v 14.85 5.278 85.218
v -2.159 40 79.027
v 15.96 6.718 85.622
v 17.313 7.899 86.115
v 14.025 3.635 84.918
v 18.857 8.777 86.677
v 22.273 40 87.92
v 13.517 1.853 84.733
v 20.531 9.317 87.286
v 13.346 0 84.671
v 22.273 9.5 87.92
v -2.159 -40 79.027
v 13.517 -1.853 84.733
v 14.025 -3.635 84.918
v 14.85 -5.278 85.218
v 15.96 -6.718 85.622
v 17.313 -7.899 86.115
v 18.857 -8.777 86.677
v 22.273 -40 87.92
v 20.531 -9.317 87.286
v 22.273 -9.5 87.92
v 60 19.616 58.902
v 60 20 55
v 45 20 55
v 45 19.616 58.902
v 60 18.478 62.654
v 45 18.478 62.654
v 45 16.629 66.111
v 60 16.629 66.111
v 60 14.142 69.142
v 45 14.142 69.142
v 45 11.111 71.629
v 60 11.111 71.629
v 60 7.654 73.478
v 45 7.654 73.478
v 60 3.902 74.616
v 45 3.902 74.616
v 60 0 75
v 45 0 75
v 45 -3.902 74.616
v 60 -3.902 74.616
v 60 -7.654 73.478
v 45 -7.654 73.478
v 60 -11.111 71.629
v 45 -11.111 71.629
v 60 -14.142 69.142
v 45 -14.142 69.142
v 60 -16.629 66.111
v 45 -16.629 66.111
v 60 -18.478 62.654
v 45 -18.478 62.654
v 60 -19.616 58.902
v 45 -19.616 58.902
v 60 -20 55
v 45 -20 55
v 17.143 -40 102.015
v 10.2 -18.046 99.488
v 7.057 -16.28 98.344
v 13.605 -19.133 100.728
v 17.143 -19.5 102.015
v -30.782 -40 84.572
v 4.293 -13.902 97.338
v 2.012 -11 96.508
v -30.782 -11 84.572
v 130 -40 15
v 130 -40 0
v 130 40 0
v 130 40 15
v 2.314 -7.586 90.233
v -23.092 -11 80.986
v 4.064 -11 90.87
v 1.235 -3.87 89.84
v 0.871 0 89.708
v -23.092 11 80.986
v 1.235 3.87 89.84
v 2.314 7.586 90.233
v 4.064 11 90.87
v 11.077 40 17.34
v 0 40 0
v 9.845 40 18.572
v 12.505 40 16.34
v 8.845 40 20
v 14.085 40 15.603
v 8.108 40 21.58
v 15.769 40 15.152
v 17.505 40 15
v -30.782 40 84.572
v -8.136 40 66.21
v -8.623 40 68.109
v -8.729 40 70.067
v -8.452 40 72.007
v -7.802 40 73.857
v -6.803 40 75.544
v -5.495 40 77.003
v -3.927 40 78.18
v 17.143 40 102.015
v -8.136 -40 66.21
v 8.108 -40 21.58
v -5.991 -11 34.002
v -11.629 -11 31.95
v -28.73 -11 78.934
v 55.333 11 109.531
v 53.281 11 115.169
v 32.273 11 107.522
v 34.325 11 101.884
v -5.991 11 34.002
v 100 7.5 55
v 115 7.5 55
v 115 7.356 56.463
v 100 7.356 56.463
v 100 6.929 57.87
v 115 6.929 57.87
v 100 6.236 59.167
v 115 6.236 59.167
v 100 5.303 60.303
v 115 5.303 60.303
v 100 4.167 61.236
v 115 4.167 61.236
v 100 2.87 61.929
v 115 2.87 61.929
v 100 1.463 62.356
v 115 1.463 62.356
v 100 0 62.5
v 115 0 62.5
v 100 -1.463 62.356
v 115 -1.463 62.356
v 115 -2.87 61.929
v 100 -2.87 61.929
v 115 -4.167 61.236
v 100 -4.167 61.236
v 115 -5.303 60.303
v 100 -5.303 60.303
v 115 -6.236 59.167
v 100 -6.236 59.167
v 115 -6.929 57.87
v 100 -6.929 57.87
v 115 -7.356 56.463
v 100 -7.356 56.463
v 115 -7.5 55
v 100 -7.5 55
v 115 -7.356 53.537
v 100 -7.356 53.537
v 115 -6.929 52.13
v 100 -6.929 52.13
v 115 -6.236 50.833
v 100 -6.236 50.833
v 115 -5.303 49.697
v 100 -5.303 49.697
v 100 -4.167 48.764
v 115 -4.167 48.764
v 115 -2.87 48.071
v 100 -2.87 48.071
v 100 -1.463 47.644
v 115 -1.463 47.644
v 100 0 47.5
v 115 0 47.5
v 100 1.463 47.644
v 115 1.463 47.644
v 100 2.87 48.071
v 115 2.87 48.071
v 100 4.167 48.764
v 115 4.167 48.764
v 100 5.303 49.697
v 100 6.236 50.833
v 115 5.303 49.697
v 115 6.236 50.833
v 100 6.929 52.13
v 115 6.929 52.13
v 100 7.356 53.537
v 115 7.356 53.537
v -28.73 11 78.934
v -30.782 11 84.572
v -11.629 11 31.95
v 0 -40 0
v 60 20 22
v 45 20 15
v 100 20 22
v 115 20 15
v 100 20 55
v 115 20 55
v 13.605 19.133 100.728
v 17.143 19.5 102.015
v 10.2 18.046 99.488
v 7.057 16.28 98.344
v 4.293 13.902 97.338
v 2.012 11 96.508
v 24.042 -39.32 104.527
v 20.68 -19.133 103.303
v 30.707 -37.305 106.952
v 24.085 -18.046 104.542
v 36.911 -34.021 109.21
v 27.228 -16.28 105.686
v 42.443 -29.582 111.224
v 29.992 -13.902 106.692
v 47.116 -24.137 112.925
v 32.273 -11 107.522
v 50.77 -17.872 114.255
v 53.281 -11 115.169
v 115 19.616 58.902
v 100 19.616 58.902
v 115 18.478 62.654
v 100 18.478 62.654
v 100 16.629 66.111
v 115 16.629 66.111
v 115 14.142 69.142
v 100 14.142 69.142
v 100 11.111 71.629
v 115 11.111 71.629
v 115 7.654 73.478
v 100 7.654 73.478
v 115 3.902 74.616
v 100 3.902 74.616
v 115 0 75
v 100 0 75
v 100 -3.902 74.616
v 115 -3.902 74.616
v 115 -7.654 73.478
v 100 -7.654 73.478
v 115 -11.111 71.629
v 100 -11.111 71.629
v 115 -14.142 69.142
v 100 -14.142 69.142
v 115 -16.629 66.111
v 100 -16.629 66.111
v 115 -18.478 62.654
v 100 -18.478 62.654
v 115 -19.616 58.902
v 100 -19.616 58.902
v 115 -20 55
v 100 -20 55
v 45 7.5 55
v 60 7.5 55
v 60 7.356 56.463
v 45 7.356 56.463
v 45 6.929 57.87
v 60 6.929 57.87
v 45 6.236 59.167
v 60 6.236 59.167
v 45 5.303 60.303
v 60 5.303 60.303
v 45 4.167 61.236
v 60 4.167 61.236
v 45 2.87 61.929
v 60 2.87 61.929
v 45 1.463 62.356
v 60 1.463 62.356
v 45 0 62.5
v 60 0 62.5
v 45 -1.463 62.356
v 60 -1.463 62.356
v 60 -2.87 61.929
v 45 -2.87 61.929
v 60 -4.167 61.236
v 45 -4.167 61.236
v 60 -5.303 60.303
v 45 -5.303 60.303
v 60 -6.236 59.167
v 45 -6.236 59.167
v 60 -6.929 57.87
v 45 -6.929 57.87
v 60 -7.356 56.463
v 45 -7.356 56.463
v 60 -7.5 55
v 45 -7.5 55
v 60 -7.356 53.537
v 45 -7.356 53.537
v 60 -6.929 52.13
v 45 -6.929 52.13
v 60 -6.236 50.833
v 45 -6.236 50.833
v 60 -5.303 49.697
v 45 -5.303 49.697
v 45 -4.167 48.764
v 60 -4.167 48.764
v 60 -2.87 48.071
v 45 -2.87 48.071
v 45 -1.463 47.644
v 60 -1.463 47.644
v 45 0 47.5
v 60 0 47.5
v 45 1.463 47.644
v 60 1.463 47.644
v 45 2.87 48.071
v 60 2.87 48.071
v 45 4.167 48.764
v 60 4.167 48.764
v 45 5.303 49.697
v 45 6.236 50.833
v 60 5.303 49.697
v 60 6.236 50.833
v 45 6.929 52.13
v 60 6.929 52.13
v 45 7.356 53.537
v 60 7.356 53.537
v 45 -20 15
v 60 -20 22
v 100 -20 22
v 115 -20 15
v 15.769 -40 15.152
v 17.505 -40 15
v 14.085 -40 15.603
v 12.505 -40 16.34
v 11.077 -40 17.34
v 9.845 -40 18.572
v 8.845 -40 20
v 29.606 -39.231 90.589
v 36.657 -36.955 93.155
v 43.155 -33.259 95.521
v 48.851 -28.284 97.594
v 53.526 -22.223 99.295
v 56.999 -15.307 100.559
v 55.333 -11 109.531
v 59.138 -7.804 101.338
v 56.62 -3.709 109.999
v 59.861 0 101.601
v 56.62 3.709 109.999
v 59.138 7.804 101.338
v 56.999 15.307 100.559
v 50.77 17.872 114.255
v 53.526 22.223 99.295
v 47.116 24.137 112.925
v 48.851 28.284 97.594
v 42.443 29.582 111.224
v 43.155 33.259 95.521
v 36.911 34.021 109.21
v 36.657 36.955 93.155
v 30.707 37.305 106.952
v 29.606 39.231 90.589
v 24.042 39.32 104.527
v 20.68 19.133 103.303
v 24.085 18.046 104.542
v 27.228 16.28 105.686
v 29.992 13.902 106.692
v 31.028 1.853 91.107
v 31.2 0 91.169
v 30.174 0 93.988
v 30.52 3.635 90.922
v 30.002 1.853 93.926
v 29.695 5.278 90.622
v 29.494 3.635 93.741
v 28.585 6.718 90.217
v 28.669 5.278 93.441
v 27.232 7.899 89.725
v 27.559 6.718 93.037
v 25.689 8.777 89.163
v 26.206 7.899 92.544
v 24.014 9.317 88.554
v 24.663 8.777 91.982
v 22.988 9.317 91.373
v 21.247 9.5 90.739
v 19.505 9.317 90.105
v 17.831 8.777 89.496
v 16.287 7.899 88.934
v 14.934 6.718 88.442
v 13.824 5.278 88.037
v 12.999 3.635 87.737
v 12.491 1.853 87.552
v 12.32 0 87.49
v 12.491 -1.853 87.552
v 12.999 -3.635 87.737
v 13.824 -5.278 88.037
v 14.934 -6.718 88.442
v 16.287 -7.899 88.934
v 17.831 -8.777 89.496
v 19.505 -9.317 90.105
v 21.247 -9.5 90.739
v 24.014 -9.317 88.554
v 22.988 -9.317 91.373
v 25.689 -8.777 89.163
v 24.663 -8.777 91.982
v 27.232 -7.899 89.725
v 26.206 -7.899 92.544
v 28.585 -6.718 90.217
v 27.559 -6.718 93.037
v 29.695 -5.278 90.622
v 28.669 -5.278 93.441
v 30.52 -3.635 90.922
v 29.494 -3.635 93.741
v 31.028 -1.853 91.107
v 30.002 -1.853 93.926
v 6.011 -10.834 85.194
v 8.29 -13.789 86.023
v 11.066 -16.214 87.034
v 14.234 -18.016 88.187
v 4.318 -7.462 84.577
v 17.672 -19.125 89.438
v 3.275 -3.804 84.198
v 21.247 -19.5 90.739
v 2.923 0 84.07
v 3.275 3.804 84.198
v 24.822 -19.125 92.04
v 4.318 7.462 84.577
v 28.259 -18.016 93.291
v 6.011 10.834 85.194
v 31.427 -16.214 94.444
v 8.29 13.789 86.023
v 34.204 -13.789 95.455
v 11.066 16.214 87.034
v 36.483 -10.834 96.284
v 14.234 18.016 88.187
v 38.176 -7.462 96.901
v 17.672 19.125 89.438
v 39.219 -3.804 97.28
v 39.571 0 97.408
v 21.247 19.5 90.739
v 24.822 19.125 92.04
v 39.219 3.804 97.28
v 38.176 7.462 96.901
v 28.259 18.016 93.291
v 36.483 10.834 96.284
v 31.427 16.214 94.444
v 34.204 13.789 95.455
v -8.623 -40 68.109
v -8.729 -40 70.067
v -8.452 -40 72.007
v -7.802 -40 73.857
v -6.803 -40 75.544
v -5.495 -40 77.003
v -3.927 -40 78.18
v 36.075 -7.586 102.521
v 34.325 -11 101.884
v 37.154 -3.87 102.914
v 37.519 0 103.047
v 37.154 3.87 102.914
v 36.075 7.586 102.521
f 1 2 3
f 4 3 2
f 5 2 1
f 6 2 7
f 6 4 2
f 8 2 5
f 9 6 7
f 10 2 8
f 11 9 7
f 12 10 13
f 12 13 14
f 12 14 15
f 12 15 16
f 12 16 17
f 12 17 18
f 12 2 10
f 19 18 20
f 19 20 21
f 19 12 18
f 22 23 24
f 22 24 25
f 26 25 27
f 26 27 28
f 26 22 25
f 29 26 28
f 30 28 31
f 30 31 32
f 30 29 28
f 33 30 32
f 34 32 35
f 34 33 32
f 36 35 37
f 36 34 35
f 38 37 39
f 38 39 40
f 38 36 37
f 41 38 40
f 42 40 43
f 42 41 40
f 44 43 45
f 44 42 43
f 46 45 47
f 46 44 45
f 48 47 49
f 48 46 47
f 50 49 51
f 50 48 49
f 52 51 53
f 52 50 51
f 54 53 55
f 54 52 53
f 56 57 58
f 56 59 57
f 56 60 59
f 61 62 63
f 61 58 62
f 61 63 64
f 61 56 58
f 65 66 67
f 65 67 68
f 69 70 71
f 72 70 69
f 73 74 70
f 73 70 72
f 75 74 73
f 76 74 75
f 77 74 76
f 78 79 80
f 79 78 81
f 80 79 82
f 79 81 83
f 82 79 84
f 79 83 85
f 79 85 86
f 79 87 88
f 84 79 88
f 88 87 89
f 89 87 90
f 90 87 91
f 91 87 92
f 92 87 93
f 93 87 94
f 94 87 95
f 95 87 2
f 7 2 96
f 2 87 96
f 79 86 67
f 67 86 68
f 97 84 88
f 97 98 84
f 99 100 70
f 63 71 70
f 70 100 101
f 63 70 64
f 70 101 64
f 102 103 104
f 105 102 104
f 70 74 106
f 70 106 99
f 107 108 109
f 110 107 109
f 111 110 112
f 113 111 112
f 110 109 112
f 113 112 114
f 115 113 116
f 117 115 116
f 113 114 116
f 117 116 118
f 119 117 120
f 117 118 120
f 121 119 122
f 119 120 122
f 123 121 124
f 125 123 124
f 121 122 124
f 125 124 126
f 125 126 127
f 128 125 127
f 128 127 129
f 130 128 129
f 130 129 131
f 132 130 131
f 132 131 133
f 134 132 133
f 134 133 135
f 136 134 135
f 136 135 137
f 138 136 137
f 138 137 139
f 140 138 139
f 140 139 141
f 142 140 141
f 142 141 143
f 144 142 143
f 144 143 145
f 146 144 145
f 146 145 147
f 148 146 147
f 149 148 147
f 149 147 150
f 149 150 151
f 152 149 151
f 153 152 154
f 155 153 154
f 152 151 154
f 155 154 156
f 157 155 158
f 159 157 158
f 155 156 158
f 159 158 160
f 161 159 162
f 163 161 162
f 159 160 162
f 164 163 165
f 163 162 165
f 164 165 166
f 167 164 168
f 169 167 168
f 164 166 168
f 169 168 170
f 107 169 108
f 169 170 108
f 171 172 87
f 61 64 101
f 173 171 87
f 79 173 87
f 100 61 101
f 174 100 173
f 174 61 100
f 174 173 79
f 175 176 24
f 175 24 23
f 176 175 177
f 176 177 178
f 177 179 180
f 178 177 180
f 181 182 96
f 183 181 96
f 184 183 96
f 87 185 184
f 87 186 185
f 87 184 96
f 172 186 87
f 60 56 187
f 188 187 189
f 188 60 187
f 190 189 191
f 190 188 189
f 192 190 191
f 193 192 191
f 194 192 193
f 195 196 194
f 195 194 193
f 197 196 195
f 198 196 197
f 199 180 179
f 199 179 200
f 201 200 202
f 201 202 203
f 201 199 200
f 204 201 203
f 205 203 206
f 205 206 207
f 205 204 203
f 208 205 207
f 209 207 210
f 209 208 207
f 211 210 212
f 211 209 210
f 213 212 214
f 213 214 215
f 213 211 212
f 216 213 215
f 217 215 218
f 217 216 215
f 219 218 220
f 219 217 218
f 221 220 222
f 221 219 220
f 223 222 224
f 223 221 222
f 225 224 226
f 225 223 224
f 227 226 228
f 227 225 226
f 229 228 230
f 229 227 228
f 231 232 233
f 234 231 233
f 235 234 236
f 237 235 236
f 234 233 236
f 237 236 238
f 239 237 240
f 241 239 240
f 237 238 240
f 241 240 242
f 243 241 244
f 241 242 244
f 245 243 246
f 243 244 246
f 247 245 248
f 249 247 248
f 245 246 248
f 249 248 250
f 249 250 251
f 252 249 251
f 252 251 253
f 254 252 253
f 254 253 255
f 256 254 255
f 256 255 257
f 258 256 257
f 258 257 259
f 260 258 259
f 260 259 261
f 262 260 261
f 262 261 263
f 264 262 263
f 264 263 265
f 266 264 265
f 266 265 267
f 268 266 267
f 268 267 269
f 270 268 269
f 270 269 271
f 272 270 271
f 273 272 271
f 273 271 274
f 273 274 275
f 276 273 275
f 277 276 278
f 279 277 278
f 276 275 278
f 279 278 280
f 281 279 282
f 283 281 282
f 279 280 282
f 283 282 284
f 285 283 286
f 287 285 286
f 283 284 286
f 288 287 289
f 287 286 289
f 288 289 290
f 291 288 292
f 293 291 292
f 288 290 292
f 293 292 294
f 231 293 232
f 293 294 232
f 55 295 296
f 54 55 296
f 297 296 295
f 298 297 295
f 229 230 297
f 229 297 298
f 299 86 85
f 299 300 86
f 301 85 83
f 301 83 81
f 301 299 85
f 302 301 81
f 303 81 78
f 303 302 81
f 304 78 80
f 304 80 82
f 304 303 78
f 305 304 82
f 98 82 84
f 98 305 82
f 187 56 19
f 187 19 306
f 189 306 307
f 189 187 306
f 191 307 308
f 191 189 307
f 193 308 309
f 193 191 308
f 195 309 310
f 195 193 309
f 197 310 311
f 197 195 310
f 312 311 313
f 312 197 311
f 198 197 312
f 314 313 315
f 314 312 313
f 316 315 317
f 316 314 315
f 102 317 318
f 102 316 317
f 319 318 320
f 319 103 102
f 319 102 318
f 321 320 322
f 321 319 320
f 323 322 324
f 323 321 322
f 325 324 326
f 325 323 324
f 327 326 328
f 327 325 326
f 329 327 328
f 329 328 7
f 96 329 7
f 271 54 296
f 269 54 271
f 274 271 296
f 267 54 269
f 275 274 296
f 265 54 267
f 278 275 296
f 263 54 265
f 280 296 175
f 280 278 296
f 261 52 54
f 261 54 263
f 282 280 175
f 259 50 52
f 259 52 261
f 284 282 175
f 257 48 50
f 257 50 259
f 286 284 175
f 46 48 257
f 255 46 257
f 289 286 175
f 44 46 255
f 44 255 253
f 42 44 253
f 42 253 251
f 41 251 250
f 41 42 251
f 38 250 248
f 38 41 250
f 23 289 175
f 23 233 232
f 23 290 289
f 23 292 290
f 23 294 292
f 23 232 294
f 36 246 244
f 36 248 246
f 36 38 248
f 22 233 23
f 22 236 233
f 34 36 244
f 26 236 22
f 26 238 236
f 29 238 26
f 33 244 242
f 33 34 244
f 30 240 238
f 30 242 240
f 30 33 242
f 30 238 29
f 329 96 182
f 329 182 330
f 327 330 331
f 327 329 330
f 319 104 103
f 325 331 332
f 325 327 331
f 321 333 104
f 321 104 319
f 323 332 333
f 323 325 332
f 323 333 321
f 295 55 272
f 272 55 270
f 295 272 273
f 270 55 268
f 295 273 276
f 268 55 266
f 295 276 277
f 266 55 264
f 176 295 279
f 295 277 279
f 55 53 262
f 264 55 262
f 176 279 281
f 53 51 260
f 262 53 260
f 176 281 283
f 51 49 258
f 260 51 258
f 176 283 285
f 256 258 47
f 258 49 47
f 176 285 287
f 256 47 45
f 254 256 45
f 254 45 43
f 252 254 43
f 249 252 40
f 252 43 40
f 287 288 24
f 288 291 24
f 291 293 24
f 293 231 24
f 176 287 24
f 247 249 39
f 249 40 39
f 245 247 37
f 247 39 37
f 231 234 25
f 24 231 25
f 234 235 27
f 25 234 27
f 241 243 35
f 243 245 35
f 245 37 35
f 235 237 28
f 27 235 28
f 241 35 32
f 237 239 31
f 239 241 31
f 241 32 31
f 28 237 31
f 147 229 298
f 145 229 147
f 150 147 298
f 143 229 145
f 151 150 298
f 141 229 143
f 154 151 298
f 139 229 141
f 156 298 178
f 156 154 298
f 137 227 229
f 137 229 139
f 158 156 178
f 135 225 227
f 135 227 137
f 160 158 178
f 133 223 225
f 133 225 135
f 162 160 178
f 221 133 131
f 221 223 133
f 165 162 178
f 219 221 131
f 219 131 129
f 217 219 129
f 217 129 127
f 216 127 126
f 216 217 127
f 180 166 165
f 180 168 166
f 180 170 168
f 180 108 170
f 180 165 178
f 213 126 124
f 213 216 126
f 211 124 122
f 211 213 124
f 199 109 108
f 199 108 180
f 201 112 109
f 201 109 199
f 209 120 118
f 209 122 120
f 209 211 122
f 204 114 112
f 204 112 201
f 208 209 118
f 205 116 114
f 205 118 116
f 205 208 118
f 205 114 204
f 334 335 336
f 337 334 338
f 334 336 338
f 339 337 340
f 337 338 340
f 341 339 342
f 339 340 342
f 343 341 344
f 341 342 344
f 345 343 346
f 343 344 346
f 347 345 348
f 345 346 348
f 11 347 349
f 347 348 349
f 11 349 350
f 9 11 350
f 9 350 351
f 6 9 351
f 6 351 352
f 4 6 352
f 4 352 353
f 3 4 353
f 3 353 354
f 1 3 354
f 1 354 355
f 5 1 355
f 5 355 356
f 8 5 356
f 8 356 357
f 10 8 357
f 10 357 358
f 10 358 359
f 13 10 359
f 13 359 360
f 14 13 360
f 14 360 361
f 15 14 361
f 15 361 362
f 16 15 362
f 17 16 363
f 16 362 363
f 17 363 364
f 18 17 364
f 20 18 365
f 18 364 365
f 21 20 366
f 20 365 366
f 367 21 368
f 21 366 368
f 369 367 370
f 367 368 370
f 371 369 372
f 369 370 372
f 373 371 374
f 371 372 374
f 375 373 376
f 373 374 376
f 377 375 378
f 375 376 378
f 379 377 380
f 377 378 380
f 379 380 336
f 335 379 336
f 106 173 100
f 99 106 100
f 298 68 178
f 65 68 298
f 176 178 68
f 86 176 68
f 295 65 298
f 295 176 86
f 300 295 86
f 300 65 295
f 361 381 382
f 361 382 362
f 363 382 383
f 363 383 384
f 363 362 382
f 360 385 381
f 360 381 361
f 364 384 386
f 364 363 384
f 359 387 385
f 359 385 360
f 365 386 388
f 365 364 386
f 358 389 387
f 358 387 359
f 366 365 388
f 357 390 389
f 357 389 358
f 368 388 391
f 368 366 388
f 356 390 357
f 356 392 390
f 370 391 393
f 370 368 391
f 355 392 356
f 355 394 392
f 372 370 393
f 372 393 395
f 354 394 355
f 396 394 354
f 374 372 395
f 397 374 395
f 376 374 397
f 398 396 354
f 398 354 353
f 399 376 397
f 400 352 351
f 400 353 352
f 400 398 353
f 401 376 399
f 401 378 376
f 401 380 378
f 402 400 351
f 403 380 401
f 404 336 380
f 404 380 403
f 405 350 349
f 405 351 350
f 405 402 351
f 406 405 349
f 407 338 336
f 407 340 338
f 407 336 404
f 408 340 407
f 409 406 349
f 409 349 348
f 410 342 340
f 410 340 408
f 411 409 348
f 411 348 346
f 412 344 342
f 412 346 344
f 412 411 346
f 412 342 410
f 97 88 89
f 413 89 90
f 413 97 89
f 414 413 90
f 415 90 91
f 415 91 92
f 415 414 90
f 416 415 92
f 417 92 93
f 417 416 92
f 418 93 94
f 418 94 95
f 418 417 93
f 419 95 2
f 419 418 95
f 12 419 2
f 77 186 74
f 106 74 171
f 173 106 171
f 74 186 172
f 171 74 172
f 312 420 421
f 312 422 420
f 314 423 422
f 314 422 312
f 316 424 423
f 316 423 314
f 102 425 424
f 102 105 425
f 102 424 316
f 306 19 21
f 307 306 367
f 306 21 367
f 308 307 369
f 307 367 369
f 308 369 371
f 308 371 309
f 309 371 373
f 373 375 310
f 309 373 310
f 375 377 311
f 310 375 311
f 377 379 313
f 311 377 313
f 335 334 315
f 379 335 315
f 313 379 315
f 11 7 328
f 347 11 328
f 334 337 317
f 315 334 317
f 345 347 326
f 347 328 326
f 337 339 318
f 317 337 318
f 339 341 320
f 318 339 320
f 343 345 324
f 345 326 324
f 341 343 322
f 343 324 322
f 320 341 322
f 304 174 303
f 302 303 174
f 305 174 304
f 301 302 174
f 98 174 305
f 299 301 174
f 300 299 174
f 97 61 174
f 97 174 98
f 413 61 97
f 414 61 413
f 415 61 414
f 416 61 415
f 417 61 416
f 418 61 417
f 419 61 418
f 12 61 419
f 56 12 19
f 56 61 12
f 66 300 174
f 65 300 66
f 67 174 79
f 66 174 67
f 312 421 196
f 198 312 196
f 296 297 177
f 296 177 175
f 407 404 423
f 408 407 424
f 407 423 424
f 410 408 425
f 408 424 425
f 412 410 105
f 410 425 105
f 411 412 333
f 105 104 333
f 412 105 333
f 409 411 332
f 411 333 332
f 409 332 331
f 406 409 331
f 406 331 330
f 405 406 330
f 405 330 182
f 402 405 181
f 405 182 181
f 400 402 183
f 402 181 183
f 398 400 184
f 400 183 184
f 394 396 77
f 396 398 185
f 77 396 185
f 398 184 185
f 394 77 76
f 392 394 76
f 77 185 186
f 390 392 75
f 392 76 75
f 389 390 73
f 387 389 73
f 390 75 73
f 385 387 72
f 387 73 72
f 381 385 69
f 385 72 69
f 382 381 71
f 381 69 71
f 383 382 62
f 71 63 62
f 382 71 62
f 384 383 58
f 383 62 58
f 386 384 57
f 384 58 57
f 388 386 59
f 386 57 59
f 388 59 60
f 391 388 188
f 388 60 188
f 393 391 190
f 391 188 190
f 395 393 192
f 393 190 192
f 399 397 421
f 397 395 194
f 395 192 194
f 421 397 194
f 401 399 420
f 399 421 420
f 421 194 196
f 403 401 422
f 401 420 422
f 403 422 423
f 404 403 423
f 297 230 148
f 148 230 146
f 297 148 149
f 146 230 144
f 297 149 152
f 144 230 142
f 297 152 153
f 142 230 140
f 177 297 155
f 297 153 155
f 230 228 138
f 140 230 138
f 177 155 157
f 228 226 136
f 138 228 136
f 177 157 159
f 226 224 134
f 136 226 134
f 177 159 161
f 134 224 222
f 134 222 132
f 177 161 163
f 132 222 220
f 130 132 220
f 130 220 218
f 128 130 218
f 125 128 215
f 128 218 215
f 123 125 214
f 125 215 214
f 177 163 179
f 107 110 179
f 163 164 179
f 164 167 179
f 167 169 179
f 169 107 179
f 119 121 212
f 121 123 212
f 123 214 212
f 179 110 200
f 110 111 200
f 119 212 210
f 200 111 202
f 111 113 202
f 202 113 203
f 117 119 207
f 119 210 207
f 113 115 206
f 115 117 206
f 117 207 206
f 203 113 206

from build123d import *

# Parameters (mm, degrees)
F1_DEPTH  = 40
F3_DEPTH  = 15
F4_DEPTH  = 20
F6_DEPTH  = 15
F8_DEPTH  = 15
F9_R      = 7.5
F10_DEPTH = 70
F13_DEPTH = 6
F11_W     = 22
F11_H     = 56
F14_DEPTH = 6
F15_R     = 9.5
F16_DEPTH = 30
F15_R_2   = 19.5
F17_DEPTH = 12
F18_R     = 10


with BuildPart() as f1:
    # F0 (on Front) → F1 (new body, symmetric)
    with BuildSketch(Plane.XZ):
        Polygon((-30.7818128993, 84.5723358707), (0, 0), (130, 0), (130, 15), (115, 15), (45, 15), (10.5031130731, 15), (-11.5561214376, 75.6072487088), (22.2728129107, 87.9199738686), (17.1425107608, 102.0153631803), align=None)
    extrude(amount=F1_DEPTH, both=True)

    # F2 (on face) → F3 (join)
    with BuildSketch(Plane(origin=(-30.7818128993, 0, 84.5723358707), x_dir=(0.9396926208, 0, 0.3420201433), z_dir=(-0.3420201433, 0, 0.9396926208))):
        with BuildLine():
            Line((51, 40), (51, -40))
            ThreePointArc((51, -40), (91, 0), (51, 40))
        make_face()
    extrude(amount=-F3_DEPTH)

    # F0 (on Front) → F4 (join, symmetric)
    with BuildSketch(Plane.XZ):
        Polygon((-30.7818128993, 84.5723358707), (0, 0), (130, 0), (130, 15), (115, 15), (45, 15), (10.5031130731, 15), (-11.5561214376, 75.6072487088), (22.2728129107, 87.9199738686), (17.1425107608, 102.0153631803), align=None)
        Polygon((45, 15), (115, 15), (115, 55), (100, 55), (100, 22), (60, 22), (60, 55), (45, 55), align=None)
    extrude(amount=F4_DEPTH, both=True)

    # F5 (on face) → F6 (join)
    with BuildSketch(Plane.YZ.offset(115)):
        with BuildLine():
            Line((-20, 55), (20, 55))
            ThreePointArc((20, 55), (0, 75), (-20, 55))
        make_face()
    extrude(amount=-F6_DEPTH)

    # F7 (on face) → F8 (join)
    with BuildSketch(Plane.YZ.offset(60)):
        with BuildLine():
            Line((-20, 55), (20, 55))
            ThreePointArc((20, 55), (0, 75), (-20, 55))
        make_face()
    extrude(amount=-F8_DEPTH)

    # F9 (on face) → F10 (cut)
    with BuildSketch(Plane.YZ.offset(115)):
        with Locations((0, 55)):
            Circle(F9_R)
    extrude(amount=-F10_DEPTH, mode=Mode.SUBTRACT)

    # F12 (on face) → F13 (cut)
    with BuildSketch(Plane(origin=(-30.7818128993, 0, 84.5723358707), x_dir=(0.9396926208, 0, 0.3420201433), z_dir=(-0.3420201433, 0, 0.9396926208))):
        with BuildLine():
            Line((89.4577690461, 11), (0, 11))
            Line((0, 11), (0, -11))
            Line((0, -11), (89.4577690461, -11))
            ThreePointArc((89.4577690461, -11), (91, 0), (89.4577690461, 11))
        make_face()
    extrude(amount=-F13_DEPTH, mode=Mode.SUBTRACT)

    # F11 (on face) → F14 (cut)
    with BuildSketch(Plane(origin=(0, 0, 0), x_dir=(0, -1, 0), z_dir=(-0.9396926208, 0, -0.3420201433))):
        with Locations((0, 62)):
            Rectangle(F11_W, F11_H)
    extrude(amount=-F14_DEPTH, mode=Mode.SUBTRACT)

    # F15 (on face) → F16 (cut)
    with BuildSketch(Plane(origin=(-30.7818128993, 0, 84.5723358707), x_dir=(0.9396926208, 0, 0.3420201433), z_dir=(-0.3420201433, 0, 0.9396926208))):
        with Locations((51, 0)):
            Circle(F15_R)
    extrude(amount=-F16_DEPTH, mode=Mode.SUBTRACT)

    # F15 (on face) → F17 (cut)
    with BuildSketch(Plane(origin=(-30.7818128993, 0, 84.5723358707), x_dir=(0.9396926208, 0, 0.3420201433), z_dir=(-0.3420201433, 0, 0.9396926208))):
        with Locations((51, 0)):
            Circle(F15_R_2)
        with Locations((51, 0)):
            Circle(F15_R, mode=Mode.SUBTRACT)
    extrude(amount=-F17_DEPTH, mode=Mode.SUBTRACT)

    # F18
    f18_edges = [f1.edges().sort_by_distance(p)[0] for p in [
        (-11.556121, 0, 75.607249),
        (10.503113, 0, 15),
    ]]
    fillet(f18_edges, radius=F18_R)


solid = f1.part
